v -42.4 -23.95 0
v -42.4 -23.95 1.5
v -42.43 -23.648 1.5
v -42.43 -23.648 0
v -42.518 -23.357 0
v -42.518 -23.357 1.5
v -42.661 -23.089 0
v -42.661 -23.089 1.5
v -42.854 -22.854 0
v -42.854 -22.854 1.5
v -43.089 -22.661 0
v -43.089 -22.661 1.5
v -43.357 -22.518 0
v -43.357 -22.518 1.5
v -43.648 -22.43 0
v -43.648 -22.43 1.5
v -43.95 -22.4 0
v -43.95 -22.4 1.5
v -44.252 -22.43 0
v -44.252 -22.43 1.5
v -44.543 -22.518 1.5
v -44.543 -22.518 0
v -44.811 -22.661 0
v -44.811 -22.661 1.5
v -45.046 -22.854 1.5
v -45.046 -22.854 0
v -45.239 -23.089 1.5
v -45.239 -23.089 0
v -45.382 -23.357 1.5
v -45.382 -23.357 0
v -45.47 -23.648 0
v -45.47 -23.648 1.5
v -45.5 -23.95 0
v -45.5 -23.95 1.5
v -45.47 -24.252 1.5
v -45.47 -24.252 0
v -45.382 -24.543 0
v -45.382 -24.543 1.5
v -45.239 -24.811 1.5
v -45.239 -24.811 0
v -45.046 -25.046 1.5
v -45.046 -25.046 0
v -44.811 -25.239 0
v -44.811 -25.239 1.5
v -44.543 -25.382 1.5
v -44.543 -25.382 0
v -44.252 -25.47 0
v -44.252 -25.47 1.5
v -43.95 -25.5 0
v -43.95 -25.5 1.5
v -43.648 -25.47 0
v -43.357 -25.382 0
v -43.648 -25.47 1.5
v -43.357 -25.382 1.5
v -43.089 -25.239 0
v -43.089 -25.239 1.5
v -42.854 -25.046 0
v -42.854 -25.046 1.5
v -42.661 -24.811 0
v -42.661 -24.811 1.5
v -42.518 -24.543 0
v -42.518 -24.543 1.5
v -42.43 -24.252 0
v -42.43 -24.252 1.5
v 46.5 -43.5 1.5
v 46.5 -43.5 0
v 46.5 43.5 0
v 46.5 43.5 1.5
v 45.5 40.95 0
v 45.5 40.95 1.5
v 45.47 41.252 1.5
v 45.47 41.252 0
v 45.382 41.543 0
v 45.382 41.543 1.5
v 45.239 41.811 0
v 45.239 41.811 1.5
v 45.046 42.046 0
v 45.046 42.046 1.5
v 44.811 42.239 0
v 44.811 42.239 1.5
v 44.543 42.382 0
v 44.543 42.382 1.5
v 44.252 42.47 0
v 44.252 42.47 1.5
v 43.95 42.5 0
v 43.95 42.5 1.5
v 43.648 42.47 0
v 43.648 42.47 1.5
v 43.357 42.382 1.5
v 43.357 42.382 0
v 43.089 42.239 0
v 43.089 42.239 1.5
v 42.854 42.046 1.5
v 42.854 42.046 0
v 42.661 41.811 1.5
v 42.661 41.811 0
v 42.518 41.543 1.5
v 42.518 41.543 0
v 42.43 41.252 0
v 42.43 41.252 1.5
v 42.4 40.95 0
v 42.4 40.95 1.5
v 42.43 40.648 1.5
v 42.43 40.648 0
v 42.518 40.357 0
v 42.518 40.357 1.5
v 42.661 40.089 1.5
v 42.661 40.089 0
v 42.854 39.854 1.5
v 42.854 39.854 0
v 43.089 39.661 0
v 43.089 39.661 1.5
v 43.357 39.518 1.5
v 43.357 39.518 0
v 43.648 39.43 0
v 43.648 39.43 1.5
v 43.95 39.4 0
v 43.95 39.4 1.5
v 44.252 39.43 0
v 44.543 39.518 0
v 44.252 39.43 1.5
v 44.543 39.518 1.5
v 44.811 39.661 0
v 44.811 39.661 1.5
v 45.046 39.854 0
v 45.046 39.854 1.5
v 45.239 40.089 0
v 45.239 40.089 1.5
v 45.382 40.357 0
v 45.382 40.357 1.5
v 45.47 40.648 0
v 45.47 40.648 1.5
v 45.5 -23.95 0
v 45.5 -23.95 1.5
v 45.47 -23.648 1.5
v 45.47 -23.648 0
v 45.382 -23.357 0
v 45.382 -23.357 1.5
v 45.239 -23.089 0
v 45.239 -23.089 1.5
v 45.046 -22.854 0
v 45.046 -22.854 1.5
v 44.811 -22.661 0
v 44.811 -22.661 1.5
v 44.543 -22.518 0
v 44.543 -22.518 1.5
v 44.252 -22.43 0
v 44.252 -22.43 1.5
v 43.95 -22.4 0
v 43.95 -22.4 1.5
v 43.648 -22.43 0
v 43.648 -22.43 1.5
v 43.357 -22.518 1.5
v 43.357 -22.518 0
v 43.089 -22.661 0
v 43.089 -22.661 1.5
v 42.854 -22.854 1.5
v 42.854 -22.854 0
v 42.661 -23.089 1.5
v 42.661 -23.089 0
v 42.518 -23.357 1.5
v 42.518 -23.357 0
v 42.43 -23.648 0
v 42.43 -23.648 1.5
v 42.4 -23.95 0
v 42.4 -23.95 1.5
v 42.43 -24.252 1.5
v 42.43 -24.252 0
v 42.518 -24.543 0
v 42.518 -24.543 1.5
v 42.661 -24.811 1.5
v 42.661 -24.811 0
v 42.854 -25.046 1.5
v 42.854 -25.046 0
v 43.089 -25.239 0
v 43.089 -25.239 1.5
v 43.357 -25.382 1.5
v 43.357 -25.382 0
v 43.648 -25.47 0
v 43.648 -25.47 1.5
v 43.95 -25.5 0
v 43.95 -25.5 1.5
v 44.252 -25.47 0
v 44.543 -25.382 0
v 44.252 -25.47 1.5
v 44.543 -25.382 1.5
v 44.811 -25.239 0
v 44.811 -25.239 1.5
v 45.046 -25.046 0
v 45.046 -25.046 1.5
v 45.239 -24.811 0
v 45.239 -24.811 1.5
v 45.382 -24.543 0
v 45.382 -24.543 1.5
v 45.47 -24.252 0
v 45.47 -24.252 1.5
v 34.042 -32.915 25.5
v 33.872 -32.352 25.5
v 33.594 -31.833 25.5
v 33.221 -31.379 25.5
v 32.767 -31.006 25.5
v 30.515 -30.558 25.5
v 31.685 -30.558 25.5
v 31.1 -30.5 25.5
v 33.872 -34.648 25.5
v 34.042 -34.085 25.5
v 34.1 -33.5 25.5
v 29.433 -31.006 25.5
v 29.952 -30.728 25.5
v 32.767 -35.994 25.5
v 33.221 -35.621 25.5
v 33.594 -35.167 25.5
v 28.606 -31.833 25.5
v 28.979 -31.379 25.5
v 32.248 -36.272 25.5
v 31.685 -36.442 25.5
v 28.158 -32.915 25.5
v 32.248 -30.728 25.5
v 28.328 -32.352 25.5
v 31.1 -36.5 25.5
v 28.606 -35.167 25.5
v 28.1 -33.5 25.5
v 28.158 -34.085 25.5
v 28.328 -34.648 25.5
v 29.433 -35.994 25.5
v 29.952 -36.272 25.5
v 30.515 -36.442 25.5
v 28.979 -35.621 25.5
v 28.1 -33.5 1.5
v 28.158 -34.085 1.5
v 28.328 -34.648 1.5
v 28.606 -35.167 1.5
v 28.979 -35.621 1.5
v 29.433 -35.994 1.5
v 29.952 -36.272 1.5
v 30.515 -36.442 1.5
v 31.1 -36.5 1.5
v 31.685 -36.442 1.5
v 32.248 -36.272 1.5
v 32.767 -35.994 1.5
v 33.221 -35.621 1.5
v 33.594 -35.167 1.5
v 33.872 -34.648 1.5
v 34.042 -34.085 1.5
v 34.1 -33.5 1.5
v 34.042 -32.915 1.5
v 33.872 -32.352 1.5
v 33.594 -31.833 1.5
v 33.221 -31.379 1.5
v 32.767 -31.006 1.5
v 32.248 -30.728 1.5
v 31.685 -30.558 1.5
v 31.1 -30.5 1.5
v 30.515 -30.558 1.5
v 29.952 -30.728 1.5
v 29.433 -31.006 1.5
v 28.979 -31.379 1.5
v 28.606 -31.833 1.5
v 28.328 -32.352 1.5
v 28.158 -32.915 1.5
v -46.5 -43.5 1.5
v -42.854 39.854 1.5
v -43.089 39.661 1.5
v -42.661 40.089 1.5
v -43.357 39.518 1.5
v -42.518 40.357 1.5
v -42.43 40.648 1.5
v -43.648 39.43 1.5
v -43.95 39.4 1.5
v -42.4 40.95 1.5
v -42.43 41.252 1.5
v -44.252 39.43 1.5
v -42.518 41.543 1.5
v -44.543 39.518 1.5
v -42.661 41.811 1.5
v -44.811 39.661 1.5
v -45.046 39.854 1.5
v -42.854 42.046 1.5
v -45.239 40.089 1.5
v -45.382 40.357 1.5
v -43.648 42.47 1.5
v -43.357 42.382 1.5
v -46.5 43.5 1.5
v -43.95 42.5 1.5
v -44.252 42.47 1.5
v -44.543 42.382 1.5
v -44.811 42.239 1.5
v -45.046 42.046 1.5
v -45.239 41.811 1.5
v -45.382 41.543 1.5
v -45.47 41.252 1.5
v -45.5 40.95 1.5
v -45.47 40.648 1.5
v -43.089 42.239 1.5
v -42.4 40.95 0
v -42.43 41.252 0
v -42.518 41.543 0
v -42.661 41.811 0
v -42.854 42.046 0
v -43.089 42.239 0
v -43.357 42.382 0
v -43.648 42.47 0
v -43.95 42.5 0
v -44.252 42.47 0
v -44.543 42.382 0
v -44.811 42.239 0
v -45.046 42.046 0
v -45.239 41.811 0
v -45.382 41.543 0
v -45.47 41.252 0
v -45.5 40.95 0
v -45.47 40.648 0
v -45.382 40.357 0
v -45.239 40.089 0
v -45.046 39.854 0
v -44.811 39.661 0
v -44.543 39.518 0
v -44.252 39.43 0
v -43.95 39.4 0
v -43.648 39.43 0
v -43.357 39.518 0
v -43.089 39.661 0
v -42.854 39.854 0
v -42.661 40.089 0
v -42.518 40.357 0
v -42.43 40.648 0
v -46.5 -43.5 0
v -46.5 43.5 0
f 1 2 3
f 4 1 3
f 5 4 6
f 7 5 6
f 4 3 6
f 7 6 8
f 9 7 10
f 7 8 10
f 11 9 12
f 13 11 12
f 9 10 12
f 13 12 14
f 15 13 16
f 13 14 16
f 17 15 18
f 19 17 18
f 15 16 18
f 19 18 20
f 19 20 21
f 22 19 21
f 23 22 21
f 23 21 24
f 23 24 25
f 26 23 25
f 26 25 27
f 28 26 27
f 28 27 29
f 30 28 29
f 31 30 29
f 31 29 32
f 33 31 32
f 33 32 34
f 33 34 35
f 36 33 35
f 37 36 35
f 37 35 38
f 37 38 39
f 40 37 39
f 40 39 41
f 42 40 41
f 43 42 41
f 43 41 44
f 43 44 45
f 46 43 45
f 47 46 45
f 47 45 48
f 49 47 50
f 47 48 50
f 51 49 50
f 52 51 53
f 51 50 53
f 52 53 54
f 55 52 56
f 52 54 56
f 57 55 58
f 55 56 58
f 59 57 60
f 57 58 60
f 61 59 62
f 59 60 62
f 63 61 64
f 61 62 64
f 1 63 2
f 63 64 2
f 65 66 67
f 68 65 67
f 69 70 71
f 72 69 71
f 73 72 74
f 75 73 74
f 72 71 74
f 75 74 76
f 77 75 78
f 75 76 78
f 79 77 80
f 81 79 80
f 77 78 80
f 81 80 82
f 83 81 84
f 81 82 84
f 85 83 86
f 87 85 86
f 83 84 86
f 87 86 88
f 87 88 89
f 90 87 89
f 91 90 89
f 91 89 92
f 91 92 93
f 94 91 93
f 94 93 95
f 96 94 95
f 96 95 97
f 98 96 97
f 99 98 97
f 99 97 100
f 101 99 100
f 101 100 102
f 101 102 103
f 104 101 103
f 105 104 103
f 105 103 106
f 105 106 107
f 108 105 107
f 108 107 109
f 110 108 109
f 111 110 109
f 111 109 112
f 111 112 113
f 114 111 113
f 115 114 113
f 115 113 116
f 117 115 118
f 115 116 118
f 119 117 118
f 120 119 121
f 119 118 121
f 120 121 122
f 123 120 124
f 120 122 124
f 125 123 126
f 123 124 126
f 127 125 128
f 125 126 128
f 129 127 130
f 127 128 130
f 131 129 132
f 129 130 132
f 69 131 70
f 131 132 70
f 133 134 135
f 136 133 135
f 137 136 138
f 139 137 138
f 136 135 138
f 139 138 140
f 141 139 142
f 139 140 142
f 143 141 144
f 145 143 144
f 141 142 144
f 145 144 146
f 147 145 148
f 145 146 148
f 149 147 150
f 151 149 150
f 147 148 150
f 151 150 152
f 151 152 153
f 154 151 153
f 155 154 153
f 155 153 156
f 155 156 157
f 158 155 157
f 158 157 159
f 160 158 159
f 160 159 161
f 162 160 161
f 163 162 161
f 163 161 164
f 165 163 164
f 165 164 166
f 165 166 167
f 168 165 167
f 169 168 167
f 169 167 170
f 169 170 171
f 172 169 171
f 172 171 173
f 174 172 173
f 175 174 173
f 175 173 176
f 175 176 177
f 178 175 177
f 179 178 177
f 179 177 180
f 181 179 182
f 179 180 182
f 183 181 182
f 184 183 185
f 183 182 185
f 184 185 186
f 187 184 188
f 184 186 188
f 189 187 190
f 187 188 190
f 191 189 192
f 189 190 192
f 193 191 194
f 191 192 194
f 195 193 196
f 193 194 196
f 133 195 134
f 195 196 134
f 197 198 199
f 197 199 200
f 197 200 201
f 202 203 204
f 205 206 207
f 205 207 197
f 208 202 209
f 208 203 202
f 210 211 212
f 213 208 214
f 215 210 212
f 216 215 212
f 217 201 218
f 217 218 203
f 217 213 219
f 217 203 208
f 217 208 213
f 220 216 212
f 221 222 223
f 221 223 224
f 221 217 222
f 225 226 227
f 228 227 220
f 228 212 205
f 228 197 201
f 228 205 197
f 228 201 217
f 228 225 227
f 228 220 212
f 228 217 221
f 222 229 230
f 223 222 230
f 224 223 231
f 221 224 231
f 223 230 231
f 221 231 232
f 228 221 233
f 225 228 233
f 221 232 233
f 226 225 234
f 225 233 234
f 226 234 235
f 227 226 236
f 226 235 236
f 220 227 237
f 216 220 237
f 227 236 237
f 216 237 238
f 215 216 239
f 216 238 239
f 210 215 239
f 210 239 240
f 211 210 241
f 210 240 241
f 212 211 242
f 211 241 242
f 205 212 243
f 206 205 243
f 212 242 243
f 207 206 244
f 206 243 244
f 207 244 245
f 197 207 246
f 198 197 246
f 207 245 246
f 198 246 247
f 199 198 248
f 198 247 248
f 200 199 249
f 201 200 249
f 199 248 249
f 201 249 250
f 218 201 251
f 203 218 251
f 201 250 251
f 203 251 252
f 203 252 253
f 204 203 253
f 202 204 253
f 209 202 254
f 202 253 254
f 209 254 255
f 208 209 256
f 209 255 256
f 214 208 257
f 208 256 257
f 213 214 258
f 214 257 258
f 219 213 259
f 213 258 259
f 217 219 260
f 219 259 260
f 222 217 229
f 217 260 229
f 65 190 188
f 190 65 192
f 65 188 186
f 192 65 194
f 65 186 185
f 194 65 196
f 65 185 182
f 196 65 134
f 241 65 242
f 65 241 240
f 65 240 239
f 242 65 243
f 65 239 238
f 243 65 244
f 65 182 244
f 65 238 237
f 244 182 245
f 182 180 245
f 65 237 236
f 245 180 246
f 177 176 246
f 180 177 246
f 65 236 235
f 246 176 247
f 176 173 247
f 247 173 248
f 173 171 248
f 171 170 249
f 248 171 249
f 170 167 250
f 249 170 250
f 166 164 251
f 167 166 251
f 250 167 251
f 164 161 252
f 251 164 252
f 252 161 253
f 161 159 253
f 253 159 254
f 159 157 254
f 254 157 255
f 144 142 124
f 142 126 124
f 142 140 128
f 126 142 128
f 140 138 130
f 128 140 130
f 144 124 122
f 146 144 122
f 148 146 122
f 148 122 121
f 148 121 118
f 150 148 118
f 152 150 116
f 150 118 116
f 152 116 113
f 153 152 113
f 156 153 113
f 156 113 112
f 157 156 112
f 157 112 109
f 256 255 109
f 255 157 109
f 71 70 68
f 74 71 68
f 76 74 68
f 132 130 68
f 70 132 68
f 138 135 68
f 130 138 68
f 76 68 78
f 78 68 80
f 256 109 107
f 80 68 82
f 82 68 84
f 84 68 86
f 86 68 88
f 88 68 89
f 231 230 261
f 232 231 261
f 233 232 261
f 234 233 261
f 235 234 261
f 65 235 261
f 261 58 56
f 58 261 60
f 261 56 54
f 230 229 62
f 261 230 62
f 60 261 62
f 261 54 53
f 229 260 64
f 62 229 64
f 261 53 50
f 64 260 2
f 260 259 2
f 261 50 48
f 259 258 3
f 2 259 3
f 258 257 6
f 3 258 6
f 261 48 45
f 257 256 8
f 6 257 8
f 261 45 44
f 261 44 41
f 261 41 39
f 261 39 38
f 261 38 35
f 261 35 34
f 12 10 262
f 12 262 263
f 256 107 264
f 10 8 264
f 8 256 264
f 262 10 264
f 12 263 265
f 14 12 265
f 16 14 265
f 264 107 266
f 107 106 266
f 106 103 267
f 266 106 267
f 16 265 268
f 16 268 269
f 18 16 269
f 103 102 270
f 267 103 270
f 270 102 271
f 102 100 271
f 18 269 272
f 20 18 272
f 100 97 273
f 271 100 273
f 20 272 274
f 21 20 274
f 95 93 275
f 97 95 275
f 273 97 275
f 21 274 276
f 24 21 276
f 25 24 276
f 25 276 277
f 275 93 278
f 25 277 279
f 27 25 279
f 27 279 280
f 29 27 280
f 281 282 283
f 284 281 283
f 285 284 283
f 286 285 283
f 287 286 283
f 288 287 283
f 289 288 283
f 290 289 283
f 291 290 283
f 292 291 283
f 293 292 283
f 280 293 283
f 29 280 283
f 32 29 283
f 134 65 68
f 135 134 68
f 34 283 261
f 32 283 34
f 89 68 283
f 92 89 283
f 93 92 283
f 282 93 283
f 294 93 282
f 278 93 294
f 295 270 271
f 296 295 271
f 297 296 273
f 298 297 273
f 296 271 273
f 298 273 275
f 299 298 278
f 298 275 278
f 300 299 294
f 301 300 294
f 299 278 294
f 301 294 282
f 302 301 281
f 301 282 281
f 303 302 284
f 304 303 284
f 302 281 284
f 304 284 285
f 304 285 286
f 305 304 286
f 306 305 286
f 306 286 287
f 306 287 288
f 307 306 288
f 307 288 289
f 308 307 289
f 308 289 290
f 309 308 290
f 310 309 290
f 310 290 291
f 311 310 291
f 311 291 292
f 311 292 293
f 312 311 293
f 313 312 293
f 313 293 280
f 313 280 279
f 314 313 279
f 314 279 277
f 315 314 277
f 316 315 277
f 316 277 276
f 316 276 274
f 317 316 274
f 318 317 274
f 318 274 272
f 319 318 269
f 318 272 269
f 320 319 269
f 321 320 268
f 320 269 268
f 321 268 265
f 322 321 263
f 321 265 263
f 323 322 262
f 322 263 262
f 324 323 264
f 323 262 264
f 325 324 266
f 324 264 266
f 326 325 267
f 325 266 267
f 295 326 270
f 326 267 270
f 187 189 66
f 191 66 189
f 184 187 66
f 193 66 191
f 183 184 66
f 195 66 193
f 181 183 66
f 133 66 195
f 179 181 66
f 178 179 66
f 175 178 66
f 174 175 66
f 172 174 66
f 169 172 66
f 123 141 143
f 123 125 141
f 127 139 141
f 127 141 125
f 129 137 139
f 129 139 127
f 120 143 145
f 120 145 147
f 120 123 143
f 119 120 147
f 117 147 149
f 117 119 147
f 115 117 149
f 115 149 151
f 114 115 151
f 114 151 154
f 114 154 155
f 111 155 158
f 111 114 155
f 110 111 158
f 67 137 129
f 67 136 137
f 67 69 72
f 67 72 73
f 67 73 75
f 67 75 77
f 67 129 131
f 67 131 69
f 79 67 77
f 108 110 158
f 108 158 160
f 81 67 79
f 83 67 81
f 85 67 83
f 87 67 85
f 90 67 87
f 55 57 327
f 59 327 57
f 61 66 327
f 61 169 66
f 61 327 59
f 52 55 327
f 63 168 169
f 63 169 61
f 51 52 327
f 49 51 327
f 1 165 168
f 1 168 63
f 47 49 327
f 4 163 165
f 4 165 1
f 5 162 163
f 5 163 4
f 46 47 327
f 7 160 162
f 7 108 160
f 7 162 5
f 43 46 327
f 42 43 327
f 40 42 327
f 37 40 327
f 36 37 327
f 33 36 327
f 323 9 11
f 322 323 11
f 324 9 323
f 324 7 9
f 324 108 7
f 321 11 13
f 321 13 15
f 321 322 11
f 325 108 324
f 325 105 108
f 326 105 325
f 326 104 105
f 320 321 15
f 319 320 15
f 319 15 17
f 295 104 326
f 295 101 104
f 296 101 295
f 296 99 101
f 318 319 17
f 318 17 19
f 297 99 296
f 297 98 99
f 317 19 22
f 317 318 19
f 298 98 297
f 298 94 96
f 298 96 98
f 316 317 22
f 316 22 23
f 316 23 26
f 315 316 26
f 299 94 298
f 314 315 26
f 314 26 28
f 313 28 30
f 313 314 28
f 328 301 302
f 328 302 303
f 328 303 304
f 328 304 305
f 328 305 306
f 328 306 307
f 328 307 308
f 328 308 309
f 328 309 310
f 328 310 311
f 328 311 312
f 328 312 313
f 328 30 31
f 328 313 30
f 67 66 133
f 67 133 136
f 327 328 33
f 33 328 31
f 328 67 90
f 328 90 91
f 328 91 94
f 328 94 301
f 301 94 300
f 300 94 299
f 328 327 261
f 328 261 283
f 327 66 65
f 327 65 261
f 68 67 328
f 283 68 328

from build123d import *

# Parameters (mm, degrees)
CROQUIS1_W                      = 93
CROQUIS1_H                      = 87
SALIENTE_EXTRUIR1_DEPTH         = 1.5
DI_METRO_DE_TALADRO_3_1_3_1_1_D = 3.1
CROQUIS9_R                      = 3
SALIENTE_EXTRUIR4_DEPTH         = 24


with BuildPart() as part:
    # Croquis1 → Saliente-Extruir1 (new body)
    with BuildSketch(Plane(origin=(0, 0, 0), x_dir=(-1, 0, 0), z_dir=(0, 0, -1))):
        Rectangle(CROQUIS1_W, CROQUIS1_H)
    extrude(amount=-SALIENTE_EXTRUIR1_DEPTH)

    # Diámetro de taladro Ø3.1 (3.1)1 (through all)
    with Locations(Plane(origin=(0, 0, 0), x_dir=(-1, 0, 0), z_dir=(0, 0, -1))):
        with Locations((43.95, -23.95), (-43.95, -23.95), (43.95, 40.95), (-43.95, 40.95)):
            Hole(DI_METRO_DE_TALADRO_3_1_3_1_1_D / 2)

    # Croquis9 → Saliente-Extruir4 (add)
    with BuildSketch(Plane.XY.offset(1.5)):
        with Locations(Location((31.1, -33.5, 0), (0, 0, 180))):
            Circle(CROQUIS9_R)
    extrude(amount=SALIENTE_EXTRUIR4_DEPTH)


solid = part.part
